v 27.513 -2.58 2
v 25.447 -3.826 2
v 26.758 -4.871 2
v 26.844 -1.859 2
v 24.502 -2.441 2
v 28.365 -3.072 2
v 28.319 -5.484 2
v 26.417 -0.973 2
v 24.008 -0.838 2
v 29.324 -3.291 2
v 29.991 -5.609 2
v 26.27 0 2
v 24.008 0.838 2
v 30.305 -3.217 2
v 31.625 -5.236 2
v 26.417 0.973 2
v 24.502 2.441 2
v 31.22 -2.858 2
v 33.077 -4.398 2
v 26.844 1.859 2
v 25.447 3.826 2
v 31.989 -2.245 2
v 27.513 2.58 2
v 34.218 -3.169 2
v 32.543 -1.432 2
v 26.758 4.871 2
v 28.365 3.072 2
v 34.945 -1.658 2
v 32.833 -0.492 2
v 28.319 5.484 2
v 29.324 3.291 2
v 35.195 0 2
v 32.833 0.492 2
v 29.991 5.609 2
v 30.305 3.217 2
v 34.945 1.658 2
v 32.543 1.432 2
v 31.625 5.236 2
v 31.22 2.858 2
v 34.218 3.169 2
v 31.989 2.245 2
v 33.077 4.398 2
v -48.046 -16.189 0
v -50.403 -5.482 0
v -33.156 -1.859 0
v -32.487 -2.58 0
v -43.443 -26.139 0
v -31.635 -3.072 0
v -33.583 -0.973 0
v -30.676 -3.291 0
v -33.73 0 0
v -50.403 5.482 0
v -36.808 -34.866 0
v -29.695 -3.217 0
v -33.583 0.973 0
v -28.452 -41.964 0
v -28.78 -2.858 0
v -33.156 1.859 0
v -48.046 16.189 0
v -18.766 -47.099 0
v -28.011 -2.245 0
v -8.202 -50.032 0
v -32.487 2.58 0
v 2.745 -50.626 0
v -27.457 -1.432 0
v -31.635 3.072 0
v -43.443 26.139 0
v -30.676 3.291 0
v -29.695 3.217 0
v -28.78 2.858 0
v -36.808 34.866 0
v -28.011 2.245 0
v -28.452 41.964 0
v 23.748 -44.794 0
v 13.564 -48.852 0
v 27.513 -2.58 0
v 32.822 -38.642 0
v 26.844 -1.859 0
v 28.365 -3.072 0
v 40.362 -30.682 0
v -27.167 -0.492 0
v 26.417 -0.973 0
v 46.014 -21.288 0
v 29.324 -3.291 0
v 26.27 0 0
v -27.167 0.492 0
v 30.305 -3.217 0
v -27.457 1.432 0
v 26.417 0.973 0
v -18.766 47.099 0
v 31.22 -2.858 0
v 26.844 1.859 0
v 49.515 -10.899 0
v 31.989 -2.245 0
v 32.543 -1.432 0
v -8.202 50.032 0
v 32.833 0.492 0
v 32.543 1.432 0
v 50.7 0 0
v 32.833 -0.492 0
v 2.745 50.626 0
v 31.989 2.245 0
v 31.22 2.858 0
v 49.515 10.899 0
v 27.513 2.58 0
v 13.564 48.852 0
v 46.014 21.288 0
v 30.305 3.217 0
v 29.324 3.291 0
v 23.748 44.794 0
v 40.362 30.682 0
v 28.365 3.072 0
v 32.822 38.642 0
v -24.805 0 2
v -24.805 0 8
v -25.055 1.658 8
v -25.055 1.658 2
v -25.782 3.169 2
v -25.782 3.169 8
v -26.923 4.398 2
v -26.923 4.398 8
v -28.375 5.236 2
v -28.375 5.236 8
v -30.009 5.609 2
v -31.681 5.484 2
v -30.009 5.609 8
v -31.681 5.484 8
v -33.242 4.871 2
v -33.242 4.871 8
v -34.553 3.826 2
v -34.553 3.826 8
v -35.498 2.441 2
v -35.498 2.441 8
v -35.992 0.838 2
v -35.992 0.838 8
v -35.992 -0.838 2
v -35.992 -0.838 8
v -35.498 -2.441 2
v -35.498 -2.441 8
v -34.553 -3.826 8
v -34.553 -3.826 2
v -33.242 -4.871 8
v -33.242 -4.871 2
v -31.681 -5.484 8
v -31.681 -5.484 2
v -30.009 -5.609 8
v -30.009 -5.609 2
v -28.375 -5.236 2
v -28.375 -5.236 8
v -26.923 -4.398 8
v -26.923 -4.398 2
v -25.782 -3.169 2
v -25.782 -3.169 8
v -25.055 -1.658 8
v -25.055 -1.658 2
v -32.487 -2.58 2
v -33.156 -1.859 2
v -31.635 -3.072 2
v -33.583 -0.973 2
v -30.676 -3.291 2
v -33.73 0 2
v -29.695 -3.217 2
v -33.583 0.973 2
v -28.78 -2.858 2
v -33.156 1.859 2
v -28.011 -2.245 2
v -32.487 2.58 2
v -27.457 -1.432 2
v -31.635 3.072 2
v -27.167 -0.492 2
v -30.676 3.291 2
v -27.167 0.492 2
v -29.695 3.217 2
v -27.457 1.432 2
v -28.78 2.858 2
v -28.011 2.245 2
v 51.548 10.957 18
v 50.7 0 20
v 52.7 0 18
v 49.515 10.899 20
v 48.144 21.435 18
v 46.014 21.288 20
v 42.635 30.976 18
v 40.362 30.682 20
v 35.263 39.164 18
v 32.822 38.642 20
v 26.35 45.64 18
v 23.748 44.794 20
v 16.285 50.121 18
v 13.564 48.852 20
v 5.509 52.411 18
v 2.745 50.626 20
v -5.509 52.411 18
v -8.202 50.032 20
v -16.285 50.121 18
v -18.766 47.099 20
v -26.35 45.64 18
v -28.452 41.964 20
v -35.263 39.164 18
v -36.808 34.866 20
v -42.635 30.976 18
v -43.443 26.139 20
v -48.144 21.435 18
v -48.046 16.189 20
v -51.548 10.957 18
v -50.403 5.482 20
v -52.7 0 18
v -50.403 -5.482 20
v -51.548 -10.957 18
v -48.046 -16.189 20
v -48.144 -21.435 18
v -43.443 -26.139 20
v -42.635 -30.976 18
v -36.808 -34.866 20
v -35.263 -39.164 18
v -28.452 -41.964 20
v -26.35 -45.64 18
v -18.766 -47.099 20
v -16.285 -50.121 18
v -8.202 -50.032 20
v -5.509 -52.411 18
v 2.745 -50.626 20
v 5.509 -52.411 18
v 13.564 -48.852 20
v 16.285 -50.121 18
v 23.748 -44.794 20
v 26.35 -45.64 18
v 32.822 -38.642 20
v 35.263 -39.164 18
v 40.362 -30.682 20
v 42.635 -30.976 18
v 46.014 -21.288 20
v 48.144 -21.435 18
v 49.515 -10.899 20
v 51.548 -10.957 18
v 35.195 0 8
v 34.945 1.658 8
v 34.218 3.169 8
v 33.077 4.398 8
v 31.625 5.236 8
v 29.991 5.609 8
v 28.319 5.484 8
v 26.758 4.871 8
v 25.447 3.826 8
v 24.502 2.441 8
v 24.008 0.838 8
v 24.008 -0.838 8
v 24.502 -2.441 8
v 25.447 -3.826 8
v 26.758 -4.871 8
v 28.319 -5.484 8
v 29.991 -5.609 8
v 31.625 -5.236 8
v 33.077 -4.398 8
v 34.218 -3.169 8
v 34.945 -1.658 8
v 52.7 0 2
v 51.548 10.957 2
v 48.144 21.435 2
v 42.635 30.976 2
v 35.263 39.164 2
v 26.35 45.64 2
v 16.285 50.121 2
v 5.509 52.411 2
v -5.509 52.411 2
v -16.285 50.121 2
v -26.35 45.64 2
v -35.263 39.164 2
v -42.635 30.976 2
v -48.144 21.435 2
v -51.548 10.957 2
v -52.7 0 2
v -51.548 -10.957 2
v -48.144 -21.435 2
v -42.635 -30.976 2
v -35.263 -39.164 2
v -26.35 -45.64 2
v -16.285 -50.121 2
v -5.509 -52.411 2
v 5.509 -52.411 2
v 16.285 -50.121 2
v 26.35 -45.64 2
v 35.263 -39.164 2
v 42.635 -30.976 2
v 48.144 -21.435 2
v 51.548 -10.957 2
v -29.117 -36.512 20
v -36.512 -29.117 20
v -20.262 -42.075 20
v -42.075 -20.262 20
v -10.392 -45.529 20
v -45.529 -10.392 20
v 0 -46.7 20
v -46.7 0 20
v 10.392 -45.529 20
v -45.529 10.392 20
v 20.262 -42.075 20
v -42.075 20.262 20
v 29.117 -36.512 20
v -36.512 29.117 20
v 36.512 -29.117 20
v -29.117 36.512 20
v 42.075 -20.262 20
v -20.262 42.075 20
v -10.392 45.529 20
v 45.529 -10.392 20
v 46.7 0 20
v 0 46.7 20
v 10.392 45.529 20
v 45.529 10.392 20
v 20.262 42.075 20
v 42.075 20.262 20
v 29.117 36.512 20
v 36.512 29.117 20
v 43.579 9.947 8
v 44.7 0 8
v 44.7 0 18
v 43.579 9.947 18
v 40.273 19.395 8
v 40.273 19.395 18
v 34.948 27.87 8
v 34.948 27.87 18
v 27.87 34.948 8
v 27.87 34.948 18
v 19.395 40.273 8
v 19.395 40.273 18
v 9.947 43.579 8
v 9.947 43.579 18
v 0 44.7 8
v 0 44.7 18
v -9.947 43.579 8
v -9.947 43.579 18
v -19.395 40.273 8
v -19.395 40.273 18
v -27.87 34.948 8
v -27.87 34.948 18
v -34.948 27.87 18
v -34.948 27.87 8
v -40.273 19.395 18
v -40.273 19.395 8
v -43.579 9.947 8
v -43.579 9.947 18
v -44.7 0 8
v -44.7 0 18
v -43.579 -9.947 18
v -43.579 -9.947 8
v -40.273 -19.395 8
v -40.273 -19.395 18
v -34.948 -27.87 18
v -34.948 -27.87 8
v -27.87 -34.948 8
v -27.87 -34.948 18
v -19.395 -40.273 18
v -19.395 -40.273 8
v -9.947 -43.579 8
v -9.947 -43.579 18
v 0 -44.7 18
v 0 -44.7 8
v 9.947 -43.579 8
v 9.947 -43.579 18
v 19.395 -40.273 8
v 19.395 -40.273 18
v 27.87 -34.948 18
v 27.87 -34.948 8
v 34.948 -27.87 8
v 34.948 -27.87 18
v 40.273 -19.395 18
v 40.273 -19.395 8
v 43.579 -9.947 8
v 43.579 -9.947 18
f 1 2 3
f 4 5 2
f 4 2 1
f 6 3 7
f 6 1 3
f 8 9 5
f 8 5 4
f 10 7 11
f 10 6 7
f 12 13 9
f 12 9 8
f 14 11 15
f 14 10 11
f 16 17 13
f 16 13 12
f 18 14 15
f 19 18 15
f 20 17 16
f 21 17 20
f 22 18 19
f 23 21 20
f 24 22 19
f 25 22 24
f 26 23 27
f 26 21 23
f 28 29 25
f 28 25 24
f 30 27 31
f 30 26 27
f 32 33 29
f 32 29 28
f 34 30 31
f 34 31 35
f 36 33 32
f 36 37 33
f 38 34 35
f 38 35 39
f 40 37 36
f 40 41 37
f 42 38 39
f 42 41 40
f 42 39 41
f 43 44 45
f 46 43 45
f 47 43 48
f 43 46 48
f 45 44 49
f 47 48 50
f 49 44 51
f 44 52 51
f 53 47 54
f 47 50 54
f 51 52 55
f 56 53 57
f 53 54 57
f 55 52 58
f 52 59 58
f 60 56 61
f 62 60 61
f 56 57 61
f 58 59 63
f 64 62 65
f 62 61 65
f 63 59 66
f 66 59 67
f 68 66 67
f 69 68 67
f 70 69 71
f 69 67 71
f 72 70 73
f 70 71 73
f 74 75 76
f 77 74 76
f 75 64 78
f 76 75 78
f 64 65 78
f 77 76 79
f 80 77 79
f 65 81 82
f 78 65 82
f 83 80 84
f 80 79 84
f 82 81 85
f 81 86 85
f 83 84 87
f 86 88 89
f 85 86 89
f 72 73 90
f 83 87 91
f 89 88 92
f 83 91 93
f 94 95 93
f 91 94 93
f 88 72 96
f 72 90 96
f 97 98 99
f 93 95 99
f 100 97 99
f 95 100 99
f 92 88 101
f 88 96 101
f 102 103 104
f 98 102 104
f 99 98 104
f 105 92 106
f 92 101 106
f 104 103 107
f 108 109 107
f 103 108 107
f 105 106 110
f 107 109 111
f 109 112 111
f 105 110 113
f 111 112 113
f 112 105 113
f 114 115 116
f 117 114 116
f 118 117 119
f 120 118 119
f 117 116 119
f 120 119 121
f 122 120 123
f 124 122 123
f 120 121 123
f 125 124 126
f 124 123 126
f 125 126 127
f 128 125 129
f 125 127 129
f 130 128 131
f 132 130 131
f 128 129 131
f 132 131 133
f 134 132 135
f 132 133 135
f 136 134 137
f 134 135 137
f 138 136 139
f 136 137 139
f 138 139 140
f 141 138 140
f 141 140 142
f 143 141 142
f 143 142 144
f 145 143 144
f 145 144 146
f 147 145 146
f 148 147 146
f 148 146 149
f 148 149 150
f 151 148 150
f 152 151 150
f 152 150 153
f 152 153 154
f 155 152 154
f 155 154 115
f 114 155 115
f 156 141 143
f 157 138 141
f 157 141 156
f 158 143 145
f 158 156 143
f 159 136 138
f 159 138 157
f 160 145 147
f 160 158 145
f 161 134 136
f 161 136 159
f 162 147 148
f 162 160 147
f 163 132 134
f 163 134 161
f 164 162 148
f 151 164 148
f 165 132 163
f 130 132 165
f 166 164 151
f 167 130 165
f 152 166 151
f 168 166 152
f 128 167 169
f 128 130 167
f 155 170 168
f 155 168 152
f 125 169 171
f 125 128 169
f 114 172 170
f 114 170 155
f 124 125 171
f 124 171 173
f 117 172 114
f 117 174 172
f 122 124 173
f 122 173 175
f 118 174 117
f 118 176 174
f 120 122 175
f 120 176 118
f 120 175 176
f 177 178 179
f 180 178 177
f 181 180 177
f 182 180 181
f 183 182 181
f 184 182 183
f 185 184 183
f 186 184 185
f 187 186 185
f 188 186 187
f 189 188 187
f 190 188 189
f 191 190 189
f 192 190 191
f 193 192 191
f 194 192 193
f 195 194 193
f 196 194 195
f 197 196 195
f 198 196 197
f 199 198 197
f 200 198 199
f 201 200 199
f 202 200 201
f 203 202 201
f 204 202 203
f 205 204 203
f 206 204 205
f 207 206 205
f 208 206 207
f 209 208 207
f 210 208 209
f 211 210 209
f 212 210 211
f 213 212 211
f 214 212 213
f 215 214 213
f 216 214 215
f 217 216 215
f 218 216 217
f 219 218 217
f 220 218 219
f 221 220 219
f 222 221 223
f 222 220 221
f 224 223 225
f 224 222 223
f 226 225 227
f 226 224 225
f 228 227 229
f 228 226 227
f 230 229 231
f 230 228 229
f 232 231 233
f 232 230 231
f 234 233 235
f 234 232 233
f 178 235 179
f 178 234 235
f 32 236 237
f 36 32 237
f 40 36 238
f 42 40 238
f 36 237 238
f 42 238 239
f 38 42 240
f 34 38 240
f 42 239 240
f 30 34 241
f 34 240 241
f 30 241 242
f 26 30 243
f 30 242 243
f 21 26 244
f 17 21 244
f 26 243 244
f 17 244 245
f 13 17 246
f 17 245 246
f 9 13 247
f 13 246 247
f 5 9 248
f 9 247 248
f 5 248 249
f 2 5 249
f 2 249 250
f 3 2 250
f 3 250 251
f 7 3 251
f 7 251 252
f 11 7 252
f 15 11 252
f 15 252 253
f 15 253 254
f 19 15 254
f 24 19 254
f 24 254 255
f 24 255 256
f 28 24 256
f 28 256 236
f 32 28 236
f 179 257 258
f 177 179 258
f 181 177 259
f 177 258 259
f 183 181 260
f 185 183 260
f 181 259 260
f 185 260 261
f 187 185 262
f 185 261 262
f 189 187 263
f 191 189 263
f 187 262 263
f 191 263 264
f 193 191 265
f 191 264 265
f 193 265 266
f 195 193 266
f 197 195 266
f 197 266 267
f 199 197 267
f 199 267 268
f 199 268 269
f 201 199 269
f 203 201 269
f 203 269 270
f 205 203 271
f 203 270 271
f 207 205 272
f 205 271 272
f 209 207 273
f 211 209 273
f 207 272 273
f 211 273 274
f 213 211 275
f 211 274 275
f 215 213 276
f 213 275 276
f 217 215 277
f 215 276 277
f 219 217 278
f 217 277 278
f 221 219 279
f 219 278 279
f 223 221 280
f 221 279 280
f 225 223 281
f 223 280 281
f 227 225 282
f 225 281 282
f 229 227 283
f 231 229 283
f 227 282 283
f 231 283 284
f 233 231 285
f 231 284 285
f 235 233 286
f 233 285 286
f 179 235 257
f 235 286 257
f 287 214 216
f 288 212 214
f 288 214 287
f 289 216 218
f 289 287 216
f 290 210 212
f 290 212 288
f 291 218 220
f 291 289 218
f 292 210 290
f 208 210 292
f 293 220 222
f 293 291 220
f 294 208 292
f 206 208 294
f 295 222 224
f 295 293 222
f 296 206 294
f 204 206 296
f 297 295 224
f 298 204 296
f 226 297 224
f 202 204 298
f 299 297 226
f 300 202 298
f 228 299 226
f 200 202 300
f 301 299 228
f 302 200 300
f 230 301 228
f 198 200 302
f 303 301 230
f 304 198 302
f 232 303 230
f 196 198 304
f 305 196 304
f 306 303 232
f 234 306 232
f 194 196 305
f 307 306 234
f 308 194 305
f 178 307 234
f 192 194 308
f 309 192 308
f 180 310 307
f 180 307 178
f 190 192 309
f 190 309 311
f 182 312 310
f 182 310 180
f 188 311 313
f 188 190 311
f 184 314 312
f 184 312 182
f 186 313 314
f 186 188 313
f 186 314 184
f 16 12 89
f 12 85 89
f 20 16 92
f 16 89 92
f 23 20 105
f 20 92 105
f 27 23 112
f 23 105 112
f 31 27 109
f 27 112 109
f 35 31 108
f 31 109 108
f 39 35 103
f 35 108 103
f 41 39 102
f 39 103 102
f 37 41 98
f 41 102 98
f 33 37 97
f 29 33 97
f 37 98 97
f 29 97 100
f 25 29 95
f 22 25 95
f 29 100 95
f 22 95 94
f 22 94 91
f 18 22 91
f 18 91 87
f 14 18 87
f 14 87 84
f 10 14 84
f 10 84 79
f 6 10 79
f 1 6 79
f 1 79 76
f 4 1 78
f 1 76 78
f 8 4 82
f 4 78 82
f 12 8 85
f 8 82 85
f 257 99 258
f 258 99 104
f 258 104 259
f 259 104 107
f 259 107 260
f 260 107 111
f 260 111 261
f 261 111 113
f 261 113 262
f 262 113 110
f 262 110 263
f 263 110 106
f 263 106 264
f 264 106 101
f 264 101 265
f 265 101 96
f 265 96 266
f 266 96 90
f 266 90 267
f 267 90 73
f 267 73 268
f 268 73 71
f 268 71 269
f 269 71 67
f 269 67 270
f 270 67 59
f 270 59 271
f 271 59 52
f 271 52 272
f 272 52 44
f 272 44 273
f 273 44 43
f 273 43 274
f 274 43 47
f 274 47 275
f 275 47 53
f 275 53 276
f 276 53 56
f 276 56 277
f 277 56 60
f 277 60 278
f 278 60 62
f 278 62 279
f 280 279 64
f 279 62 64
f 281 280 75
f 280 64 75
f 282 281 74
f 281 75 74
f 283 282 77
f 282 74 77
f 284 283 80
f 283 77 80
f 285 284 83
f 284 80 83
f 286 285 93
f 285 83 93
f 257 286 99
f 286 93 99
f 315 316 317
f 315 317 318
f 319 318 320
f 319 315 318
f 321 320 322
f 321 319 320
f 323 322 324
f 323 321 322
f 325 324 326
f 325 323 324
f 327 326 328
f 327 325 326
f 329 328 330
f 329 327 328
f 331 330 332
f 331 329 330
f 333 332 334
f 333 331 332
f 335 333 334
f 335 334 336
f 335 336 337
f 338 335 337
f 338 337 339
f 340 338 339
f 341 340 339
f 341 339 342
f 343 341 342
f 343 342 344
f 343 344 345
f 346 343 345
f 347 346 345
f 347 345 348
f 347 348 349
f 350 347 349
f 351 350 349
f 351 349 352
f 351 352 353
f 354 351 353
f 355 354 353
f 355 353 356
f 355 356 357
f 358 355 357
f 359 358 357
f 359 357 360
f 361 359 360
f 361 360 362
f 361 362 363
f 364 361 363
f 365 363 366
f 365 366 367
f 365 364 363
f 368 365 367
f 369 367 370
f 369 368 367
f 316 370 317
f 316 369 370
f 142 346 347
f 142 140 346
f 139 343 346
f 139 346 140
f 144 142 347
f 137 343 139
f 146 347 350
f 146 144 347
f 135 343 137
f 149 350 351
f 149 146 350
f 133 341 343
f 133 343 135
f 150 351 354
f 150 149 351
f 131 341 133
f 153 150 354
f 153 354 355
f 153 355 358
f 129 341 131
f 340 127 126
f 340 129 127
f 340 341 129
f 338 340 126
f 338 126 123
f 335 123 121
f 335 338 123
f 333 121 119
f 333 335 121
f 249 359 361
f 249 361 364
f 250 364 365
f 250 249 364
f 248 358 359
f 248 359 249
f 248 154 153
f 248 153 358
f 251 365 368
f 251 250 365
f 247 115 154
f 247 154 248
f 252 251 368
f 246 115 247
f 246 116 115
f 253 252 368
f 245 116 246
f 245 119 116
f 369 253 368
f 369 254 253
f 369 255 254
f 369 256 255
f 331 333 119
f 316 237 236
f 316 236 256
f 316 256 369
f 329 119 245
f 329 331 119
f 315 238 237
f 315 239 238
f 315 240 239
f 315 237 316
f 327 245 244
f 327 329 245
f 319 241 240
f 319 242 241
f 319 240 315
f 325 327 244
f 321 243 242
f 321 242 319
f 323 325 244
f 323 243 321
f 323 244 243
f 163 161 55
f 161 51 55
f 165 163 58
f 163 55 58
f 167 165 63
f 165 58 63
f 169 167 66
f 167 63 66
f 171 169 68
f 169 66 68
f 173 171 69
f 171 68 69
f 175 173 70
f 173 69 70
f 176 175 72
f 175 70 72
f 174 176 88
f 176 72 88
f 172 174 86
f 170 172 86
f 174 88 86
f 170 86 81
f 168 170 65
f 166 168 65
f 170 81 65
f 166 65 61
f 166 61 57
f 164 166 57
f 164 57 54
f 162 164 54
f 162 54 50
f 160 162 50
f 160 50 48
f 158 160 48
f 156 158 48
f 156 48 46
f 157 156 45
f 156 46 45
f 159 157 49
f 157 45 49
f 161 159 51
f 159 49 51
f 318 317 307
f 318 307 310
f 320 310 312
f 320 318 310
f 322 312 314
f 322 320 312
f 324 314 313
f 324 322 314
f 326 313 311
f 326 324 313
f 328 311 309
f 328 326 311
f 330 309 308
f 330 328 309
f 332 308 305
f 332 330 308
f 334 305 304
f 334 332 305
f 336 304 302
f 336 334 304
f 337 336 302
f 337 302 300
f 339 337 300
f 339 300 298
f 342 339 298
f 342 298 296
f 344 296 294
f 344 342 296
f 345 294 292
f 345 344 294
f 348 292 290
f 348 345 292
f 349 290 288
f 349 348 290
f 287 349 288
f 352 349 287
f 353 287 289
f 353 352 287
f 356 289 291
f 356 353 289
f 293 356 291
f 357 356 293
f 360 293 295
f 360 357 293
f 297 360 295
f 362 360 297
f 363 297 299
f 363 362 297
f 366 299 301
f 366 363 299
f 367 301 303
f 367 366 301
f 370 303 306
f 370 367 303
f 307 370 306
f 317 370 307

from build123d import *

# Parameters (mm, degrees)
F0_R           = 44.7
F1_DEPTH       = 8
F0_R_2         = 52.7000017464
F2_DEPTH       = 20
F4_D           = 6.6
F4_CBORE_D     = 11.25
F4_CBORE_DEPTH = 6
F5_SIZE        = 2


with BuildPart() as f1:
    # F0 (on Top) → F1 (new body)
    with BuildSketch(Plane.XY):
        Circle(F0_R)
    extrude(amount=F1_DEPTH)

    # F0 (on Top) → F2 (join)
    with BuildSketch(Plane.XY):
        Circle(F0_R_2)
        Circle(F0_R, mode=Mode.SUBTRACT)
    extrude(amount=F2_DEPTH)

    # F4 (through all)
    with Locations(Plane.XY.offset(8)):
        with Locations((-30.4298021065, 0), (29.5701978935, 0)):
            CounterBoreHole(F4_D / 2, F4_CBORE_D / 2, F4_CBORE_DEPTH)

    # F5
    f5_edges = [f1.edges().sort_by_distance(p)[0] for p in [
        (-52.700002, 0, 0),
        (-52.700002, 0, 20),
        (-44.7, 0, 20),
    ]]
    chamfer(f5_edges, length=F5_SIZE)


solid = f1.part
